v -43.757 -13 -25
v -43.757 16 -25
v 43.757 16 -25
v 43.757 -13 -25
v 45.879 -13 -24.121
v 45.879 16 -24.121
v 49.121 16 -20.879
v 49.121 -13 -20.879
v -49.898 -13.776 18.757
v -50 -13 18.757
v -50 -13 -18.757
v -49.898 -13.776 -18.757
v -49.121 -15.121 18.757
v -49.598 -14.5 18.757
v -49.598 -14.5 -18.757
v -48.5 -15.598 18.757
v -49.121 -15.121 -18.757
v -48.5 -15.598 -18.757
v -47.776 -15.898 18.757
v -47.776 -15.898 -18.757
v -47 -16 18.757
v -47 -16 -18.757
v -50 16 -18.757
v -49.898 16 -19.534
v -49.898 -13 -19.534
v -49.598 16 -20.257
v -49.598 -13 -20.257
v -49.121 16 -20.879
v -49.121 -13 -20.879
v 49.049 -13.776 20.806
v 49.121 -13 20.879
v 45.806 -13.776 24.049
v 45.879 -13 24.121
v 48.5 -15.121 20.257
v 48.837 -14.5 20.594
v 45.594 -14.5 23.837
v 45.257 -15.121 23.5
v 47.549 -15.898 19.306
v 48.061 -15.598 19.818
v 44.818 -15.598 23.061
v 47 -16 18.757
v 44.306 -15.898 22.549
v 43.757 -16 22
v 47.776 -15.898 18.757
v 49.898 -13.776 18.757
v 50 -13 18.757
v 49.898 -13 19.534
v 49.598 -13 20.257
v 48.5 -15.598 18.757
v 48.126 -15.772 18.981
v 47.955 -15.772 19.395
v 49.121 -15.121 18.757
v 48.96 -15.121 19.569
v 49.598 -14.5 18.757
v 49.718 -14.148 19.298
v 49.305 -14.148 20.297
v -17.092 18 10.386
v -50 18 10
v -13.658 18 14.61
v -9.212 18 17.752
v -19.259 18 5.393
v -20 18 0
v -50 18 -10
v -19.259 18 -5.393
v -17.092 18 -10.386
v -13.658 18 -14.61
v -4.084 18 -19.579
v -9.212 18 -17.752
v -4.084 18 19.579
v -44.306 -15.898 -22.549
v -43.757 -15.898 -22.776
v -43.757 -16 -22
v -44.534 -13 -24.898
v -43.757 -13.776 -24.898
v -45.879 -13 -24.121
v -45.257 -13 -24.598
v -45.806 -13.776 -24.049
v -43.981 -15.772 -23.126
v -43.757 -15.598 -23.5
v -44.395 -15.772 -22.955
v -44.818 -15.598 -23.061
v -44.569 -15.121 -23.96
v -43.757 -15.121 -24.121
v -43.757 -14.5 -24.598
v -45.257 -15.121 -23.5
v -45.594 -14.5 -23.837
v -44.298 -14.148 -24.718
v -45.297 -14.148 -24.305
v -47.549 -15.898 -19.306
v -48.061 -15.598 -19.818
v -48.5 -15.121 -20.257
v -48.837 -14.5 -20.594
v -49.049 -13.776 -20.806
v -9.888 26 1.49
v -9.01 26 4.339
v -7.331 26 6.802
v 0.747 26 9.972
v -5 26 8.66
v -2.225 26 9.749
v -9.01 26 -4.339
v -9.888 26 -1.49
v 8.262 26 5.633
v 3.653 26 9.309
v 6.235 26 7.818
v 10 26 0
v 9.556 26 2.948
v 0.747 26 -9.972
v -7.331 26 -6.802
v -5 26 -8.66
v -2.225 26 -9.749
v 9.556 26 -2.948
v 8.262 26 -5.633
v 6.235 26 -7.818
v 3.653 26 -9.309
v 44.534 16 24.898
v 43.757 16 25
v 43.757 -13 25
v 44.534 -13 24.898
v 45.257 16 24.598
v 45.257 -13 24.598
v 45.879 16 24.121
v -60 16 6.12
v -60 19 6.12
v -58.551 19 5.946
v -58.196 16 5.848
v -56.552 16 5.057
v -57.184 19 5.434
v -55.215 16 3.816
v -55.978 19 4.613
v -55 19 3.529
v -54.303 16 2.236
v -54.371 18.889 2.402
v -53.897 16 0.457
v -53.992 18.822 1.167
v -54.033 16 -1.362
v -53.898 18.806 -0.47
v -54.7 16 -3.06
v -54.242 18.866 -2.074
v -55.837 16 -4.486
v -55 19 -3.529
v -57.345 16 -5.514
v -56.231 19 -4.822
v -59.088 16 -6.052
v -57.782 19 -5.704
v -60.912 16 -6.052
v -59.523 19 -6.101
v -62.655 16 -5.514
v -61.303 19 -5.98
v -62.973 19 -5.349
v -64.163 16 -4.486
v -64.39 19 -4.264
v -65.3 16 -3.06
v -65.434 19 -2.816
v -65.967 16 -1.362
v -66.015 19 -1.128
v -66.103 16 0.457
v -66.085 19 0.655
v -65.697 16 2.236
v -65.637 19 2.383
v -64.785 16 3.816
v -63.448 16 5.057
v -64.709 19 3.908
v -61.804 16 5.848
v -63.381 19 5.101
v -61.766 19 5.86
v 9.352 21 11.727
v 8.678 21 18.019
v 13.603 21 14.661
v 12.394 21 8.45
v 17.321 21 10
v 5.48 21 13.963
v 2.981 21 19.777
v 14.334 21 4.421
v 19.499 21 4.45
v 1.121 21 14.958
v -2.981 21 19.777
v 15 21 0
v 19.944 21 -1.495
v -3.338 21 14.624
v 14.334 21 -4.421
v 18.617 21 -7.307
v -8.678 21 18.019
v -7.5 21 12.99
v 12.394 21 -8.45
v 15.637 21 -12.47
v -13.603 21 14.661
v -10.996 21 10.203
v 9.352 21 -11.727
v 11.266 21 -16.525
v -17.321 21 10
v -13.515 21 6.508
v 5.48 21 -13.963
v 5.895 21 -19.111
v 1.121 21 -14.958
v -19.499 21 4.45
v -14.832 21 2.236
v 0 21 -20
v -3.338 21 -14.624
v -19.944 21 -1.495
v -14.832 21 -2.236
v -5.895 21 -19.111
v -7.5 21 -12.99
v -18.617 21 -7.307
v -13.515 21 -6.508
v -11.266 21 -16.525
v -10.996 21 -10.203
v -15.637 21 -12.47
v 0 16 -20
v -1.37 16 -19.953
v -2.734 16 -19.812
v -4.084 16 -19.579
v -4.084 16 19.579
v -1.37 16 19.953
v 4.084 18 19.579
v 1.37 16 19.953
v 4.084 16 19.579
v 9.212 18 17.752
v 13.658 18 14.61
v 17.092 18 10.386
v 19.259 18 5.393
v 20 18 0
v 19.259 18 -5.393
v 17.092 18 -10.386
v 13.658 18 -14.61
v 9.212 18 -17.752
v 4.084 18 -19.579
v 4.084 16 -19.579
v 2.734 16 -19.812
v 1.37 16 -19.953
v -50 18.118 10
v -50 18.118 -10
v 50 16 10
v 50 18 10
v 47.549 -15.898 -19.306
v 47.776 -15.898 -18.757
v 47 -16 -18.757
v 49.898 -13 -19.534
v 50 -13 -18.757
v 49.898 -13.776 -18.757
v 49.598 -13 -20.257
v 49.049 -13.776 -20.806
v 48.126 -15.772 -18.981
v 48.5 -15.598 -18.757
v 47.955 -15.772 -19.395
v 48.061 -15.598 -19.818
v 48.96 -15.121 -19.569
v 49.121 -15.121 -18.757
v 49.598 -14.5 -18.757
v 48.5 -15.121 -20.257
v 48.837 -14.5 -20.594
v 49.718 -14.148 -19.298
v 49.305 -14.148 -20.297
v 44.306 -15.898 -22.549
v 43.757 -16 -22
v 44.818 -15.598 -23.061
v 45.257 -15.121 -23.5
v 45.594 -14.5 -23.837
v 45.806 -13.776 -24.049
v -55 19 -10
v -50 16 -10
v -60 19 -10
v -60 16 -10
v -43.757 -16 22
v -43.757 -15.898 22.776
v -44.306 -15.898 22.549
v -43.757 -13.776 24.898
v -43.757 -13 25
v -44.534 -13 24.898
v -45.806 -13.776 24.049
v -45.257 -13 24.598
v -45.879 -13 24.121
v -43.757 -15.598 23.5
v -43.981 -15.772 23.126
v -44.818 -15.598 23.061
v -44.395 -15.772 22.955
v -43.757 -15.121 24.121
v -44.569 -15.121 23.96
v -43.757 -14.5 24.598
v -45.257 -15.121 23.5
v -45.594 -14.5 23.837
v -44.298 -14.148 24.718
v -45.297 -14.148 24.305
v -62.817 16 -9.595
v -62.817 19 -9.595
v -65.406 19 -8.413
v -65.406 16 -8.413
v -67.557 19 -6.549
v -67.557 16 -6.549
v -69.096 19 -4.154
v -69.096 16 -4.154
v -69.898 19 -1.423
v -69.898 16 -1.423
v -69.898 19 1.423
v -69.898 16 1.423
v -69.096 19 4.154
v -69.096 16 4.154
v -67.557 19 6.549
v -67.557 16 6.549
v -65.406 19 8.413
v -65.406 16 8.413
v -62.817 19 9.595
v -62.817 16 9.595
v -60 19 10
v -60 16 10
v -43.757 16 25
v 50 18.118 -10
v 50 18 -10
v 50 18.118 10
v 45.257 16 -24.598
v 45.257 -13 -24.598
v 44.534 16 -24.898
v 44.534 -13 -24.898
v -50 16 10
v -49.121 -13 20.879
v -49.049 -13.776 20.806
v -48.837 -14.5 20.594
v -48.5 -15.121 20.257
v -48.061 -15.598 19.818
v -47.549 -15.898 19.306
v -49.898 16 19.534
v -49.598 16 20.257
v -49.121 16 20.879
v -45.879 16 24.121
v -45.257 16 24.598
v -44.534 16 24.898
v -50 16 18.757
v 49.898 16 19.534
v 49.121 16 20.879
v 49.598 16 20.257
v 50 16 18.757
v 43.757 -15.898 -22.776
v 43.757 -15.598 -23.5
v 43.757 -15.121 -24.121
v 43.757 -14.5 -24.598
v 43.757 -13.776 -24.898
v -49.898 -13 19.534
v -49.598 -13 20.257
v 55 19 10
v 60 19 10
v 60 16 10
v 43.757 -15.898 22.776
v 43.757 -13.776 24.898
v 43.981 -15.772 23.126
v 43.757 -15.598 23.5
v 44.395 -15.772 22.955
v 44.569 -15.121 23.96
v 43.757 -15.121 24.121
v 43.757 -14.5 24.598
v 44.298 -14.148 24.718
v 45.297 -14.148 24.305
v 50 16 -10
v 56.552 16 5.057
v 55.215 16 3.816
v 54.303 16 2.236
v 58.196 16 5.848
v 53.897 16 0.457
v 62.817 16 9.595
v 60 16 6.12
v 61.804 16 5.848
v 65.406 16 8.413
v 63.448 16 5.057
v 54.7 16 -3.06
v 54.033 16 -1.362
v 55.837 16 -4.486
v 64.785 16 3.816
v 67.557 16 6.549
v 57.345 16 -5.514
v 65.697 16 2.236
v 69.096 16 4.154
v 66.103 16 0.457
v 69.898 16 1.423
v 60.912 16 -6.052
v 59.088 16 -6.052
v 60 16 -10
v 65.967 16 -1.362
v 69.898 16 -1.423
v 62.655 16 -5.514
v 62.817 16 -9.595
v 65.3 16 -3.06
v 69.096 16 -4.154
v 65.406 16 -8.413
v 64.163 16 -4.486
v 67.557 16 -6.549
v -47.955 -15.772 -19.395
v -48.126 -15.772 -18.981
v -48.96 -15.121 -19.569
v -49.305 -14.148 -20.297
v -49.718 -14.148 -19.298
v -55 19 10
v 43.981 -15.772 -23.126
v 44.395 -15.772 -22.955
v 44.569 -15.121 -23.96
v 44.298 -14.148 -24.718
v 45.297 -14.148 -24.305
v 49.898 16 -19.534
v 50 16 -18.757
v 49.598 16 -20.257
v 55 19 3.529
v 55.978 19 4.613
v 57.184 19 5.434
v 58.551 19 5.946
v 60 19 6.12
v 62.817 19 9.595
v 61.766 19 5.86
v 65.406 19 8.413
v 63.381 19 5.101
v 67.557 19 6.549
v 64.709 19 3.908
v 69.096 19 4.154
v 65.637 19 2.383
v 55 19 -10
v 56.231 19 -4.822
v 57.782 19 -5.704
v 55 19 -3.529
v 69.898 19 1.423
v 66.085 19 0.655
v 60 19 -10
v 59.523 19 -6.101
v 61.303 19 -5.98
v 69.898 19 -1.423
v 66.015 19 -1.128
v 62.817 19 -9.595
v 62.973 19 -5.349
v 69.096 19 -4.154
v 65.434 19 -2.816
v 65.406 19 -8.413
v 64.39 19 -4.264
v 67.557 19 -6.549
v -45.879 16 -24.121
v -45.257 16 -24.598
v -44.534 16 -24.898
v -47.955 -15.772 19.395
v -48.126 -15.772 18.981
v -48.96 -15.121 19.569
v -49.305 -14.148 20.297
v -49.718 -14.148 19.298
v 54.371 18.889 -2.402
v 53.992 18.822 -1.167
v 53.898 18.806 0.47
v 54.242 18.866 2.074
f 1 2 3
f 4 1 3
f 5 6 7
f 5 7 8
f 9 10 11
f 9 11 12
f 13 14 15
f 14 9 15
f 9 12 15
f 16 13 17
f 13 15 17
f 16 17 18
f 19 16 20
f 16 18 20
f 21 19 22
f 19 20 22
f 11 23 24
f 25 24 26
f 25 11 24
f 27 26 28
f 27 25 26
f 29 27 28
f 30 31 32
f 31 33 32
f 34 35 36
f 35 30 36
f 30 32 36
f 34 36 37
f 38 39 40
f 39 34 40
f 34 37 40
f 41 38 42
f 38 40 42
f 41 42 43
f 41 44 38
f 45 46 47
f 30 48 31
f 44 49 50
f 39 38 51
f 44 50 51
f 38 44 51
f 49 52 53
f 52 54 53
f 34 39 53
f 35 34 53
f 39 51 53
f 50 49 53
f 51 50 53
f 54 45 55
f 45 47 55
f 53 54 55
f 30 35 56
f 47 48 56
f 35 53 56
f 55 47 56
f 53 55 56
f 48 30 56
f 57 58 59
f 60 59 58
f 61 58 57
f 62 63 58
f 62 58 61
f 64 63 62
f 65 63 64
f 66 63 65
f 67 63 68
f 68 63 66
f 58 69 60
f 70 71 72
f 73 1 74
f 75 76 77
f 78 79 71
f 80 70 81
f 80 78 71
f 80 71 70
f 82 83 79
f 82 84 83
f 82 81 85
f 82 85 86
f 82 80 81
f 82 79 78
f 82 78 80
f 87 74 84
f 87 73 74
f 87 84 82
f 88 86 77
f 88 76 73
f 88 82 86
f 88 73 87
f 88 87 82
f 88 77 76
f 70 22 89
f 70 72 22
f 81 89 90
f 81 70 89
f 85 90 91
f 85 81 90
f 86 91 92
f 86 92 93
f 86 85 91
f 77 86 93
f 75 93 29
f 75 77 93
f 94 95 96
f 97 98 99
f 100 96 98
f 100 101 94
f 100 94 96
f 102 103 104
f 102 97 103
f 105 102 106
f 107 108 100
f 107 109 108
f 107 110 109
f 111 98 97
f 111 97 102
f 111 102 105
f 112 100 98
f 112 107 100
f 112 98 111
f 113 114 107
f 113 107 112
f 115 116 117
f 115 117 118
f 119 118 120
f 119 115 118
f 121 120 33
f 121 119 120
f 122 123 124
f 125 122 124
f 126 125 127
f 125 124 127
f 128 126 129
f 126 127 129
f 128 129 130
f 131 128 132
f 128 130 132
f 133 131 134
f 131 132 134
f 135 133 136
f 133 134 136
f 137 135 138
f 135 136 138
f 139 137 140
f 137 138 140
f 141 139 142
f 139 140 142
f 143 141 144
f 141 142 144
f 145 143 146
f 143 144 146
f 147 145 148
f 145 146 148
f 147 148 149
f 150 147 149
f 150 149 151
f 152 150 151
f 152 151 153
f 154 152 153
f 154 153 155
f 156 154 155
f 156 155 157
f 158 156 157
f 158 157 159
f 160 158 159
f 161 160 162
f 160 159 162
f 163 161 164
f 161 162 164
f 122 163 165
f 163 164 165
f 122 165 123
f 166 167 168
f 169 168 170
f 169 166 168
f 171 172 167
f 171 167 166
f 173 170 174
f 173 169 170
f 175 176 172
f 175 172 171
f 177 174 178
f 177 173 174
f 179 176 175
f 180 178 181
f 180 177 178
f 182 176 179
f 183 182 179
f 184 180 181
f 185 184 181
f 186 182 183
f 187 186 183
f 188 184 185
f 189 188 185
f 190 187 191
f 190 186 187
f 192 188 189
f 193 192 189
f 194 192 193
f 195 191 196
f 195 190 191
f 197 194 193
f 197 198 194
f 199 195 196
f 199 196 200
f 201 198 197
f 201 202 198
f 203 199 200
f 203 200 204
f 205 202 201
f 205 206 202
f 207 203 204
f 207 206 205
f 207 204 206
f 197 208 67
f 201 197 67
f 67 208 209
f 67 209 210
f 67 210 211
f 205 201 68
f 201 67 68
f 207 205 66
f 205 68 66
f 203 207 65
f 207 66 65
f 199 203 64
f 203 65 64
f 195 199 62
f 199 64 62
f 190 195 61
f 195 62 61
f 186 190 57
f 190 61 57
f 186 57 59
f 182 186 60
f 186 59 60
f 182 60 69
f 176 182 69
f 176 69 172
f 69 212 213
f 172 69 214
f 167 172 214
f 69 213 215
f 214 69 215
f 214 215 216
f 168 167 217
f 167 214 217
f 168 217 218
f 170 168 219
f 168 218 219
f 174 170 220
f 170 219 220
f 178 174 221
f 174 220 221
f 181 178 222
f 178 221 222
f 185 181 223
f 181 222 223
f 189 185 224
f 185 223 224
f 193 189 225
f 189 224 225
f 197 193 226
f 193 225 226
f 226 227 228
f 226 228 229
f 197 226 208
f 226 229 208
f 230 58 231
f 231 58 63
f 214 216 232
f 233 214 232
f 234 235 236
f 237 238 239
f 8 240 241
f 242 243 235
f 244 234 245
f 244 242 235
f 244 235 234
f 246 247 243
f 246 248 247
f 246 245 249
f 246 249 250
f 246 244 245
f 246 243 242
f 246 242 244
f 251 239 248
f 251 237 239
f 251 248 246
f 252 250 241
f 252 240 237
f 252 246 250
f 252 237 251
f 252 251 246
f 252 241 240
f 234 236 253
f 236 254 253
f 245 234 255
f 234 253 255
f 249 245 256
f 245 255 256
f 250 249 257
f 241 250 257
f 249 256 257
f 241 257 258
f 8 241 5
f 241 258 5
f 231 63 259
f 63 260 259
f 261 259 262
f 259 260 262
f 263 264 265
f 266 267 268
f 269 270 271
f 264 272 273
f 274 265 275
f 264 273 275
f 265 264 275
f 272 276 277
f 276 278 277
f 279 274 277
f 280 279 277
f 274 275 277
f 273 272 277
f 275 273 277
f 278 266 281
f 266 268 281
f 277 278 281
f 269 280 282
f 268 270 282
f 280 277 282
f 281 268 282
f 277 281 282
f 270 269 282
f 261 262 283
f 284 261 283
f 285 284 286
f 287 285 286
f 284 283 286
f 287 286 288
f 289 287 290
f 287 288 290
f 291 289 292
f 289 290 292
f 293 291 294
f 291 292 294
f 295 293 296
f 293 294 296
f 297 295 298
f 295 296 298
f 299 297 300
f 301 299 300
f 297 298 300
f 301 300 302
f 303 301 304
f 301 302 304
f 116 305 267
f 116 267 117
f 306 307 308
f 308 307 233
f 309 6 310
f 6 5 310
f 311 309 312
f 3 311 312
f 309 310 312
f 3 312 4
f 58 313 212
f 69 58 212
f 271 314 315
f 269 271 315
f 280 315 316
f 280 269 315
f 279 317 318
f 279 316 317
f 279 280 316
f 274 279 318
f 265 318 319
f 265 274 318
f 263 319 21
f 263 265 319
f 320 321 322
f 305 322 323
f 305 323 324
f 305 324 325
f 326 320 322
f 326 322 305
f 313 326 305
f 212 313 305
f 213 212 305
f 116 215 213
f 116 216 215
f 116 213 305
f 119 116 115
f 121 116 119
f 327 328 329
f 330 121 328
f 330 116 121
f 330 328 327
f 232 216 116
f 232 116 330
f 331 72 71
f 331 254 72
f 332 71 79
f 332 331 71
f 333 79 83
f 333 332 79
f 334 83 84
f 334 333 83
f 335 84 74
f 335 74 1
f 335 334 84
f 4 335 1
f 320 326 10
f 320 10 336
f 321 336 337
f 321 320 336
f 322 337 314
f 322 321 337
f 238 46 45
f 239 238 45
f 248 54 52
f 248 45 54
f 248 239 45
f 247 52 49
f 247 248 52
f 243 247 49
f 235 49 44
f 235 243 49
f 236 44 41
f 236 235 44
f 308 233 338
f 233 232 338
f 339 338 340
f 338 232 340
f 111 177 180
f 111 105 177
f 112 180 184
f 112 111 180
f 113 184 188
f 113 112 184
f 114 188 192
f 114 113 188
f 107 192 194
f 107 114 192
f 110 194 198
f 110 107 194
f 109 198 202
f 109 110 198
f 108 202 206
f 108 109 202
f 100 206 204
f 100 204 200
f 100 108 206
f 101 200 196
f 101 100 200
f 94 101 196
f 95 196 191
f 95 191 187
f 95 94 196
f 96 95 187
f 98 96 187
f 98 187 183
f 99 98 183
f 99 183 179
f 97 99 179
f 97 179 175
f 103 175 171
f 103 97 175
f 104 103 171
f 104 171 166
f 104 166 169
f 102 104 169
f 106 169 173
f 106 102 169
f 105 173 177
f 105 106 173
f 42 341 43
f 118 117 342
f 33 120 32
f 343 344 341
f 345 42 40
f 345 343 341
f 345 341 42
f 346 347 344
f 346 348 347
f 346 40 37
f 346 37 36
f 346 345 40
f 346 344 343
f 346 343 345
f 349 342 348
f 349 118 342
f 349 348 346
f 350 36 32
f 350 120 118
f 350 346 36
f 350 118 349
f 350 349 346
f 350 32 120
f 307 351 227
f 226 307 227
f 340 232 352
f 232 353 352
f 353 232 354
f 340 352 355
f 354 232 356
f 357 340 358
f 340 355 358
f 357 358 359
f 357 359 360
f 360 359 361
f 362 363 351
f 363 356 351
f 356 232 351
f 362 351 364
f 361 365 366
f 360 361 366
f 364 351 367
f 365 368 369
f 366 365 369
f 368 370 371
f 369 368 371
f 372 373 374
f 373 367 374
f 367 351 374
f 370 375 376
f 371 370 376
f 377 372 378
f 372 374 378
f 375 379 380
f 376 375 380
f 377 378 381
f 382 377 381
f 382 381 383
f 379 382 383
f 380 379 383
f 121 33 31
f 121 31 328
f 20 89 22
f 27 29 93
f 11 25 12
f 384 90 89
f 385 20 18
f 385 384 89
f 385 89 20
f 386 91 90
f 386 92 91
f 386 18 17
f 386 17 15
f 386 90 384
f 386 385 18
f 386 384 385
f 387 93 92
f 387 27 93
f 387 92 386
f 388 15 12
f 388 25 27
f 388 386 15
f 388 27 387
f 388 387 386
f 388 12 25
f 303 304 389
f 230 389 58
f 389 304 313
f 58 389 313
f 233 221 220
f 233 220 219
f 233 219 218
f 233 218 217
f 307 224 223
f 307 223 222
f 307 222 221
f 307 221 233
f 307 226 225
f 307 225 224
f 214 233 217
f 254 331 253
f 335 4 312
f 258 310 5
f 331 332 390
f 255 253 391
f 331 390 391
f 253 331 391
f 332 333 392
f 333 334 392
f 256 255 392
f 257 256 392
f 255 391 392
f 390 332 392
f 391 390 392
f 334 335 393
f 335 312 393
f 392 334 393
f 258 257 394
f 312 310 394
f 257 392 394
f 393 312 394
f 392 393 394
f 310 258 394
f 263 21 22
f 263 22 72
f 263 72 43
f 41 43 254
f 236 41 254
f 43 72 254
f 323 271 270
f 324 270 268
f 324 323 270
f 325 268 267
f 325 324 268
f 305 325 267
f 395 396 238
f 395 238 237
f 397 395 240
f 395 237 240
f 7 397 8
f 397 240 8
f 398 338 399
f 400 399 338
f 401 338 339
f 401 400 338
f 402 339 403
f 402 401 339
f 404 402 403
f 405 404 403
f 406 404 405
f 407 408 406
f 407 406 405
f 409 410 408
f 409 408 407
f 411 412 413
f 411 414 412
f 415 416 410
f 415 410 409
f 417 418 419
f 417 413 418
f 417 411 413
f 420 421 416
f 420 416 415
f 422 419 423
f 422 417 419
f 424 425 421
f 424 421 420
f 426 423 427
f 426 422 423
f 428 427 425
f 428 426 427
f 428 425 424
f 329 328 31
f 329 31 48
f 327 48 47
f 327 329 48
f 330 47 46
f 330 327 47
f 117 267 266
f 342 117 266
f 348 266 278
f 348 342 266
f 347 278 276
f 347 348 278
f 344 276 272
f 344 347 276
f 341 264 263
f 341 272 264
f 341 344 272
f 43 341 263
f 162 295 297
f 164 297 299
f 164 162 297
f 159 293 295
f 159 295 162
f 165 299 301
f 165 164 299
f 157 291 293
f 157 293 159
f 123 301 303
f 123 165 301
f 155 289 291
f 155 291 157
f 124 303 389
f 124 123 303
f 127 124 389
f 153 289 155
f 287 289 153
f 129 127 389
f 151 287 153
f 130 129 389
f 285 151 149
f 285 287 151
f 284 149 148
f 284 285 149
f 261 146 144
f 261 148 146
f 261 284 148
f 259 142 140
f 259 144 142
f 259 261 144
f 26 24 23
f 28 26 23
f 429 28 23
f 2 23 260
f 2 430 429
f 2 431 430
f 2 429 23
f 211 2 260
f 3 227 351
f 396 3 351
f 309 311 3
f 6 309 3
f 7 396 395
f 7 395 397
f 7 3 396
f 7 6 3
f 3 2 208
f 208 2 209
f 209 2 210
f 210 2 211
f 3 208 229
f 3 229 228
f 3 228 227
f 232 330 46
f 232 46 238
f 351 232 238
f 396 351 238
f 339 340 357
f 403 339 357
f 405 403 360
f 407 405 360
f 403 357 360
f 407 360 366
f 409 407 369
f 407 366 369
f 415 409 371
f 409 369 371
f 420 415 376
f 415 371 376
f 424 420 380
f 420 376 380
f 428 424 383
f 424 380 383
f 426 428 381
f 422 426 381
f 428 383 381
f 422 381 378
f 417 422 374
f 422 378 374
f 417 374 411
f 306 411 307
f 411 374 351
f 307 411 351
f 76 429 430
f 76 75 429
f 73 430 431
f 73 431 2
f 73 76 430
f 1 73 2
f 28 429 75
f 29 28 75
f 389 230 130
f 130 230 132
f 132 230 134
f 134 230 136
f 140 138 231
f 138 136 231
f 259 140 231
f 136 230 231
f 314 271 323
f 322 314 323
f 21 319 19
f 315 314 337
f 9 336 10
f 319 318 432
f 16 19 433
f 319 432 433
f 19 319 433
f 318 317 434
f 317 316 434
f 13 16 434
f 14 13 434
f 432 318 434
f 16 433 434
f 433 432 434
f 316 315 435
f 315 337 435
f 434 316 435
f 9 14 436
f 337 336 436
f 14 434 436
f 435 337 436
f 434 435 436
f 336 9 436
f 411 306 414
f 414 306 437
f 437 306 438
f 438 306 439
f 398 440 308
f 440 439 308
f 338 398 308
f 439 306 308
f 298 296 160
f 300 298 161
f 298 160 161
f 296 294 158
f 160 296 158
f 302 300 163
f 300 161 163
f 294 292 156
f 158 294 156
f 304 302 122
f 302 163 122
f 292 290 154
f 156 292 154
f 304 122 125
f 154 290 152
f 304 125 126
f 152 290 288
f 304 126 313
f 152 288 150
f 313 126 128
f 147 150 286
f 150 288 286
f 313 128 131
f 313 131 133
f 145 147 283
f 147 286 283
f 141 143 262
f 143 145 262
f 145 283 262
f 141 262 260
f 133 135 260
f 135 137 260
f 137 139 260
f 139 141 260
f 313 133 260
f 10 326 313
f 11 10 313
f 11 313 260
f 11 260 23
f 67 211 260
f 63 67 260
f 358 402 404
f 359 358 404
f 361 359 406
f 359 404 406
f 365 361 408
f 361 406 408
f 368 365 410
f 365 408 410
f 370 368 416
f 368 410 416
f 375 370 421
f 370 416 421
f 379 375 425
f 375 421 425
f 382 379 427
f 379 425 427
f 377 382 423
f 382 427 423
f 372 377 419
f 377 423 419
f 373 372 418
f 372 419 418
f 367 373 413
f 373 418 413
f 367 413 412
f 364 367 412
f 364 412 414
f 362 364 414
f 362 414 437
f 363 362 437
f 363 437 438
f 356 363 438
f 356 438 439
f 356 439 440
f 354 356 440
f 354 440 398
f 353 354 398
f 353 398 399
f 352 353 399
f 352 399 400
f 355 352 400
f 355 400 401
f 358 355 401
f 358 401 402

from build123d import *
from OCP.BRepFilletAPI import BRepFilletAPI_MakeChamfer

# Parameters (mm, degrees)
SKETCH1_W                               = 100
SKETCH1_H                               = 50
BOSS_EXTRUDE1_DEPTH                     = 16
SKETCH2_R                               = 20
BOSS_EXTRUDE2_DEPTH                     = 5
BOSS_EXTRUDE3_DEPTH                     = 2
BOSS_EXTRUDE4_DEPTH                     = 3
CHAMFER1_SIZE                           = 5
CHAMFER1_SIZE2                          = 0.881634904
SKETCH3_R                               = 15
BOSS_EXTRUDE5_DEPTH                     = 5
BOSS_EXTRUDE5_TAPER                     = 45
CBORE_FOR_M5_HEX_HEAD_BOLT1_D           = 5.3
CBORE_FOR_M5_HEX_HEAD_BOLT1_DEPTH       = 15
CBORE_FOR_M5_HEX_HEAD_BOLT1_CBORE_D     = 12.24
CBORE_FOR_M5_HEX_HEAD_BOLT1_CBORE_DEPTH = 3.58
CBORE_FOR_M5_HEX_HEAD_BOLT1_TIP         = 1.59228064
CHAMFER2_SIZE                           = 5
FILLET3_R                               = 3


# Read off the part's stored shape, not the designer's step: Boss-Extrude4
with BuildPart() as part:
    # Sketch1 → Boss-Extrude1 (new, symmetric)
    with BuildSketch(Plane(origin=(0, 0, 0), x_dir=(1, 0, 0), z_dir=(0, 1, 0))):
        Rectangle(SKETCH1_W, SKETCH1_H)
    extrude(amount=BOSS_EXTRUDE1_DEPTH, both=True)

    # Sketch2 → Boss-Extrude2 (add)
    with BuildSketch(Plane(origin=(0, 16, 0), x_dir=(1, 0, 0), z_dir=(0, 1, 0))):
        with Locations(Location((0, 0, 0), (0, 0, 90))):
            Circle(SKETCH2_R)
    extrude(amount=BOSS_EXTRUDE2_DEPTH)

    # Sketch2<3> → Boss-Extrude3 (add)
    with BuildSketch(Plane(origin=(0, 16, 0), x_dir=(1, 0, 0), z_dir=(0, 1, 0))):
        with BuildLine():
            Line((-4.084295569, 19.578522153), (-50, 10))
            Line((-50, 10), (-50, -10))
            Line((-50, -10), (-4.084295569, -19.578522153))
            ThreePointArc((-4.084295569, -19.578522153), (-20, 0), (-4.084295569, 19.578522153))
        make_face()
        with BuildLine():
            Line((50, 10), (4.084295569, 19.578522153))
            ThreePointArc((4.084295569, 19.578522153), (15.519115815, 12.615745888), (20, 0))
            ThreePointArc((20, 0), (15.519115815, -12.615745888), (4.084295569, -19.578522153))
            Line((4.084295569, -19.578522153), (50, -10))
            Line((50, -10), (50, 10))
        make_face()
    extrude(amount=BOSS_EXTRUDE3_DEPTH)

    # Boss-Extrude4 outline → Boss-Extrude4 (add)
    with BuildSketch(Plane(origin=(0, 16, 0), x_dir=(1, 0, 0), z_dir=(0, 1, 0))):
        with BuildLine():
            Line((-60, -10), (-50, -10))
            Line((-50, -10), (-50, 10))
            Line((-50, 10), (-60, 10))
            ThreePointArc((-60, 10), (-70, 0), (-60, -10))
        make_face()
        with BuildLine():
            ThreePointArc((60, -10), (70, 0), (60, 10))
            Line((60, 10), (50, 10))
            Line((50, 10), (50, -10))
            Line((50, -10), (60, -10))
        make_face()
    extrude(amount=BOSS_EXTRUDE4_DEPTH)

    # Chamfer1: one chamfer whose edges measure the first distance from different faces: ONE call of the kernel's chamfer builder (chamfer() names one face for all edges)
    chamfer1_edges_1 = [part.edges().sort_by_distance(p)[0] for p in [
        (-50, 19, 0),
    ]]
    chamfer1_side_1 = [part.faces().sort_by_distance(p)[0] for p in [
        (-59.066501411, 19, 0),
    ]]
    chamfer1_edges_2 = [part.edges().sort_by_distance(p)[0] for p in [
        (50, 19, 0),
    ]]
    chamfer1_side_2 = [part.faces().sort_by_distance(p)[0] for p in [
        (59.066501411, 19, 0),
    ]]
    chamfer1 = BRepFilletAPI_MakeChamfer(part.part.solid().wrapped)
    for e in chamfer1_edges_1:
        chamfer1.Add(CHAMFER1_SIZE, CHAMFER1_SIZE2, e.wrapped, chamfer1_side_1[0].wrapped)  # the first distance lies on this face
    for e in chamfer1_edges_2:
        chamfer1.Add(CHAMFER1_SIZE, CHAMFER1_SIZE2, e.wrapped, chamfer1_side_2[0].wrapped)  # the first distance lies on this face
    add(Compound.cast(chamfer1.Shape()), mode=Mode.REPLACE)

    # Sketch3 → Boss-Extrude5 (add)
    with BuildSketch(Plane(origin=(0, 21, 0), x_dir=(1, 0, 0), z_dir=(0, 1, 0))):
        Circle(SKETCH3_R)
    extrude(amount=BOSS_EXTRUDE5_DEPTH, taper=BOSS_EXTRUDE5_TAPER)

    # CBORE for M5 Hex Head Bolt1
    with Locations(Plane(origin=(-60, 19, 0), x_dir=(0, 0, 1), z_dir=(0, 1, 0))):
        with Locations((0, 0), (0, 120)):
            CounterBoreHole(CBORE_FOR_M5_HEX_HEAD_BOLT1_D / 2, CBORE_FOR_M5_HEX_HEAD_BOLT1_CBORE_D / 2, CBORE_FOR_M5_HEX_HEAD_BOLT1_CBORE_DEPTH, depth=CBORE_FOR_M5_HEX_HEAD_BOLT1_DEPTH)
            with Locations((0, 0, -(CBORE_FOR_M5_HEX_HEAD_BOLT1_DEPTH + CBORE_FOR_M5_HEX_HEAD_BOLT1_TIP / 2))):  # 118° drill point
                Cone(0, CBORE_FOR_M5_HEX_HEAD_BOLT1_D / 2, CBORE_FOR_M5_HEX_HEAD_BOLT1_TIP, mode=Mode.SUBTRACT)

    # Chamfer2
    chamfer2_edges = [part.edges().sort_by_distance(p)[0] for p in [
        (50, 0, 25),
        (-50, 0, 25),
        (-50, 0, -25),
        (50, 0, -25),
    ]]
    chamfer(chamfer2_edges, length=CHAMFER2_SIZE)

    # Fillet3
    fillet3_edges = [part.edges().sort_by_distance(p)[0] for p in [
        (-50, -16, 0),
        (-50, 0, 20),
        (-50, 0, -20),
        (50, -16, 0),
        (0, -16, 25),
        (0, -16, -25),
        (47.5, -16, 22.5),
        (-47.5, -16, 22.5),
        (47.5, -16, -22.5),
        (-47.5, -16, -22.5),
        (45, 0, -25),
        (-45, 0, -25),
        (50, 0, 20),
        (50, 0, -20),
        (45, 0, 25),
        (-45, 0, 25),
    ]]
    fillet(fillet3_edges, radius=FILLET3_R)


solid = part.part
